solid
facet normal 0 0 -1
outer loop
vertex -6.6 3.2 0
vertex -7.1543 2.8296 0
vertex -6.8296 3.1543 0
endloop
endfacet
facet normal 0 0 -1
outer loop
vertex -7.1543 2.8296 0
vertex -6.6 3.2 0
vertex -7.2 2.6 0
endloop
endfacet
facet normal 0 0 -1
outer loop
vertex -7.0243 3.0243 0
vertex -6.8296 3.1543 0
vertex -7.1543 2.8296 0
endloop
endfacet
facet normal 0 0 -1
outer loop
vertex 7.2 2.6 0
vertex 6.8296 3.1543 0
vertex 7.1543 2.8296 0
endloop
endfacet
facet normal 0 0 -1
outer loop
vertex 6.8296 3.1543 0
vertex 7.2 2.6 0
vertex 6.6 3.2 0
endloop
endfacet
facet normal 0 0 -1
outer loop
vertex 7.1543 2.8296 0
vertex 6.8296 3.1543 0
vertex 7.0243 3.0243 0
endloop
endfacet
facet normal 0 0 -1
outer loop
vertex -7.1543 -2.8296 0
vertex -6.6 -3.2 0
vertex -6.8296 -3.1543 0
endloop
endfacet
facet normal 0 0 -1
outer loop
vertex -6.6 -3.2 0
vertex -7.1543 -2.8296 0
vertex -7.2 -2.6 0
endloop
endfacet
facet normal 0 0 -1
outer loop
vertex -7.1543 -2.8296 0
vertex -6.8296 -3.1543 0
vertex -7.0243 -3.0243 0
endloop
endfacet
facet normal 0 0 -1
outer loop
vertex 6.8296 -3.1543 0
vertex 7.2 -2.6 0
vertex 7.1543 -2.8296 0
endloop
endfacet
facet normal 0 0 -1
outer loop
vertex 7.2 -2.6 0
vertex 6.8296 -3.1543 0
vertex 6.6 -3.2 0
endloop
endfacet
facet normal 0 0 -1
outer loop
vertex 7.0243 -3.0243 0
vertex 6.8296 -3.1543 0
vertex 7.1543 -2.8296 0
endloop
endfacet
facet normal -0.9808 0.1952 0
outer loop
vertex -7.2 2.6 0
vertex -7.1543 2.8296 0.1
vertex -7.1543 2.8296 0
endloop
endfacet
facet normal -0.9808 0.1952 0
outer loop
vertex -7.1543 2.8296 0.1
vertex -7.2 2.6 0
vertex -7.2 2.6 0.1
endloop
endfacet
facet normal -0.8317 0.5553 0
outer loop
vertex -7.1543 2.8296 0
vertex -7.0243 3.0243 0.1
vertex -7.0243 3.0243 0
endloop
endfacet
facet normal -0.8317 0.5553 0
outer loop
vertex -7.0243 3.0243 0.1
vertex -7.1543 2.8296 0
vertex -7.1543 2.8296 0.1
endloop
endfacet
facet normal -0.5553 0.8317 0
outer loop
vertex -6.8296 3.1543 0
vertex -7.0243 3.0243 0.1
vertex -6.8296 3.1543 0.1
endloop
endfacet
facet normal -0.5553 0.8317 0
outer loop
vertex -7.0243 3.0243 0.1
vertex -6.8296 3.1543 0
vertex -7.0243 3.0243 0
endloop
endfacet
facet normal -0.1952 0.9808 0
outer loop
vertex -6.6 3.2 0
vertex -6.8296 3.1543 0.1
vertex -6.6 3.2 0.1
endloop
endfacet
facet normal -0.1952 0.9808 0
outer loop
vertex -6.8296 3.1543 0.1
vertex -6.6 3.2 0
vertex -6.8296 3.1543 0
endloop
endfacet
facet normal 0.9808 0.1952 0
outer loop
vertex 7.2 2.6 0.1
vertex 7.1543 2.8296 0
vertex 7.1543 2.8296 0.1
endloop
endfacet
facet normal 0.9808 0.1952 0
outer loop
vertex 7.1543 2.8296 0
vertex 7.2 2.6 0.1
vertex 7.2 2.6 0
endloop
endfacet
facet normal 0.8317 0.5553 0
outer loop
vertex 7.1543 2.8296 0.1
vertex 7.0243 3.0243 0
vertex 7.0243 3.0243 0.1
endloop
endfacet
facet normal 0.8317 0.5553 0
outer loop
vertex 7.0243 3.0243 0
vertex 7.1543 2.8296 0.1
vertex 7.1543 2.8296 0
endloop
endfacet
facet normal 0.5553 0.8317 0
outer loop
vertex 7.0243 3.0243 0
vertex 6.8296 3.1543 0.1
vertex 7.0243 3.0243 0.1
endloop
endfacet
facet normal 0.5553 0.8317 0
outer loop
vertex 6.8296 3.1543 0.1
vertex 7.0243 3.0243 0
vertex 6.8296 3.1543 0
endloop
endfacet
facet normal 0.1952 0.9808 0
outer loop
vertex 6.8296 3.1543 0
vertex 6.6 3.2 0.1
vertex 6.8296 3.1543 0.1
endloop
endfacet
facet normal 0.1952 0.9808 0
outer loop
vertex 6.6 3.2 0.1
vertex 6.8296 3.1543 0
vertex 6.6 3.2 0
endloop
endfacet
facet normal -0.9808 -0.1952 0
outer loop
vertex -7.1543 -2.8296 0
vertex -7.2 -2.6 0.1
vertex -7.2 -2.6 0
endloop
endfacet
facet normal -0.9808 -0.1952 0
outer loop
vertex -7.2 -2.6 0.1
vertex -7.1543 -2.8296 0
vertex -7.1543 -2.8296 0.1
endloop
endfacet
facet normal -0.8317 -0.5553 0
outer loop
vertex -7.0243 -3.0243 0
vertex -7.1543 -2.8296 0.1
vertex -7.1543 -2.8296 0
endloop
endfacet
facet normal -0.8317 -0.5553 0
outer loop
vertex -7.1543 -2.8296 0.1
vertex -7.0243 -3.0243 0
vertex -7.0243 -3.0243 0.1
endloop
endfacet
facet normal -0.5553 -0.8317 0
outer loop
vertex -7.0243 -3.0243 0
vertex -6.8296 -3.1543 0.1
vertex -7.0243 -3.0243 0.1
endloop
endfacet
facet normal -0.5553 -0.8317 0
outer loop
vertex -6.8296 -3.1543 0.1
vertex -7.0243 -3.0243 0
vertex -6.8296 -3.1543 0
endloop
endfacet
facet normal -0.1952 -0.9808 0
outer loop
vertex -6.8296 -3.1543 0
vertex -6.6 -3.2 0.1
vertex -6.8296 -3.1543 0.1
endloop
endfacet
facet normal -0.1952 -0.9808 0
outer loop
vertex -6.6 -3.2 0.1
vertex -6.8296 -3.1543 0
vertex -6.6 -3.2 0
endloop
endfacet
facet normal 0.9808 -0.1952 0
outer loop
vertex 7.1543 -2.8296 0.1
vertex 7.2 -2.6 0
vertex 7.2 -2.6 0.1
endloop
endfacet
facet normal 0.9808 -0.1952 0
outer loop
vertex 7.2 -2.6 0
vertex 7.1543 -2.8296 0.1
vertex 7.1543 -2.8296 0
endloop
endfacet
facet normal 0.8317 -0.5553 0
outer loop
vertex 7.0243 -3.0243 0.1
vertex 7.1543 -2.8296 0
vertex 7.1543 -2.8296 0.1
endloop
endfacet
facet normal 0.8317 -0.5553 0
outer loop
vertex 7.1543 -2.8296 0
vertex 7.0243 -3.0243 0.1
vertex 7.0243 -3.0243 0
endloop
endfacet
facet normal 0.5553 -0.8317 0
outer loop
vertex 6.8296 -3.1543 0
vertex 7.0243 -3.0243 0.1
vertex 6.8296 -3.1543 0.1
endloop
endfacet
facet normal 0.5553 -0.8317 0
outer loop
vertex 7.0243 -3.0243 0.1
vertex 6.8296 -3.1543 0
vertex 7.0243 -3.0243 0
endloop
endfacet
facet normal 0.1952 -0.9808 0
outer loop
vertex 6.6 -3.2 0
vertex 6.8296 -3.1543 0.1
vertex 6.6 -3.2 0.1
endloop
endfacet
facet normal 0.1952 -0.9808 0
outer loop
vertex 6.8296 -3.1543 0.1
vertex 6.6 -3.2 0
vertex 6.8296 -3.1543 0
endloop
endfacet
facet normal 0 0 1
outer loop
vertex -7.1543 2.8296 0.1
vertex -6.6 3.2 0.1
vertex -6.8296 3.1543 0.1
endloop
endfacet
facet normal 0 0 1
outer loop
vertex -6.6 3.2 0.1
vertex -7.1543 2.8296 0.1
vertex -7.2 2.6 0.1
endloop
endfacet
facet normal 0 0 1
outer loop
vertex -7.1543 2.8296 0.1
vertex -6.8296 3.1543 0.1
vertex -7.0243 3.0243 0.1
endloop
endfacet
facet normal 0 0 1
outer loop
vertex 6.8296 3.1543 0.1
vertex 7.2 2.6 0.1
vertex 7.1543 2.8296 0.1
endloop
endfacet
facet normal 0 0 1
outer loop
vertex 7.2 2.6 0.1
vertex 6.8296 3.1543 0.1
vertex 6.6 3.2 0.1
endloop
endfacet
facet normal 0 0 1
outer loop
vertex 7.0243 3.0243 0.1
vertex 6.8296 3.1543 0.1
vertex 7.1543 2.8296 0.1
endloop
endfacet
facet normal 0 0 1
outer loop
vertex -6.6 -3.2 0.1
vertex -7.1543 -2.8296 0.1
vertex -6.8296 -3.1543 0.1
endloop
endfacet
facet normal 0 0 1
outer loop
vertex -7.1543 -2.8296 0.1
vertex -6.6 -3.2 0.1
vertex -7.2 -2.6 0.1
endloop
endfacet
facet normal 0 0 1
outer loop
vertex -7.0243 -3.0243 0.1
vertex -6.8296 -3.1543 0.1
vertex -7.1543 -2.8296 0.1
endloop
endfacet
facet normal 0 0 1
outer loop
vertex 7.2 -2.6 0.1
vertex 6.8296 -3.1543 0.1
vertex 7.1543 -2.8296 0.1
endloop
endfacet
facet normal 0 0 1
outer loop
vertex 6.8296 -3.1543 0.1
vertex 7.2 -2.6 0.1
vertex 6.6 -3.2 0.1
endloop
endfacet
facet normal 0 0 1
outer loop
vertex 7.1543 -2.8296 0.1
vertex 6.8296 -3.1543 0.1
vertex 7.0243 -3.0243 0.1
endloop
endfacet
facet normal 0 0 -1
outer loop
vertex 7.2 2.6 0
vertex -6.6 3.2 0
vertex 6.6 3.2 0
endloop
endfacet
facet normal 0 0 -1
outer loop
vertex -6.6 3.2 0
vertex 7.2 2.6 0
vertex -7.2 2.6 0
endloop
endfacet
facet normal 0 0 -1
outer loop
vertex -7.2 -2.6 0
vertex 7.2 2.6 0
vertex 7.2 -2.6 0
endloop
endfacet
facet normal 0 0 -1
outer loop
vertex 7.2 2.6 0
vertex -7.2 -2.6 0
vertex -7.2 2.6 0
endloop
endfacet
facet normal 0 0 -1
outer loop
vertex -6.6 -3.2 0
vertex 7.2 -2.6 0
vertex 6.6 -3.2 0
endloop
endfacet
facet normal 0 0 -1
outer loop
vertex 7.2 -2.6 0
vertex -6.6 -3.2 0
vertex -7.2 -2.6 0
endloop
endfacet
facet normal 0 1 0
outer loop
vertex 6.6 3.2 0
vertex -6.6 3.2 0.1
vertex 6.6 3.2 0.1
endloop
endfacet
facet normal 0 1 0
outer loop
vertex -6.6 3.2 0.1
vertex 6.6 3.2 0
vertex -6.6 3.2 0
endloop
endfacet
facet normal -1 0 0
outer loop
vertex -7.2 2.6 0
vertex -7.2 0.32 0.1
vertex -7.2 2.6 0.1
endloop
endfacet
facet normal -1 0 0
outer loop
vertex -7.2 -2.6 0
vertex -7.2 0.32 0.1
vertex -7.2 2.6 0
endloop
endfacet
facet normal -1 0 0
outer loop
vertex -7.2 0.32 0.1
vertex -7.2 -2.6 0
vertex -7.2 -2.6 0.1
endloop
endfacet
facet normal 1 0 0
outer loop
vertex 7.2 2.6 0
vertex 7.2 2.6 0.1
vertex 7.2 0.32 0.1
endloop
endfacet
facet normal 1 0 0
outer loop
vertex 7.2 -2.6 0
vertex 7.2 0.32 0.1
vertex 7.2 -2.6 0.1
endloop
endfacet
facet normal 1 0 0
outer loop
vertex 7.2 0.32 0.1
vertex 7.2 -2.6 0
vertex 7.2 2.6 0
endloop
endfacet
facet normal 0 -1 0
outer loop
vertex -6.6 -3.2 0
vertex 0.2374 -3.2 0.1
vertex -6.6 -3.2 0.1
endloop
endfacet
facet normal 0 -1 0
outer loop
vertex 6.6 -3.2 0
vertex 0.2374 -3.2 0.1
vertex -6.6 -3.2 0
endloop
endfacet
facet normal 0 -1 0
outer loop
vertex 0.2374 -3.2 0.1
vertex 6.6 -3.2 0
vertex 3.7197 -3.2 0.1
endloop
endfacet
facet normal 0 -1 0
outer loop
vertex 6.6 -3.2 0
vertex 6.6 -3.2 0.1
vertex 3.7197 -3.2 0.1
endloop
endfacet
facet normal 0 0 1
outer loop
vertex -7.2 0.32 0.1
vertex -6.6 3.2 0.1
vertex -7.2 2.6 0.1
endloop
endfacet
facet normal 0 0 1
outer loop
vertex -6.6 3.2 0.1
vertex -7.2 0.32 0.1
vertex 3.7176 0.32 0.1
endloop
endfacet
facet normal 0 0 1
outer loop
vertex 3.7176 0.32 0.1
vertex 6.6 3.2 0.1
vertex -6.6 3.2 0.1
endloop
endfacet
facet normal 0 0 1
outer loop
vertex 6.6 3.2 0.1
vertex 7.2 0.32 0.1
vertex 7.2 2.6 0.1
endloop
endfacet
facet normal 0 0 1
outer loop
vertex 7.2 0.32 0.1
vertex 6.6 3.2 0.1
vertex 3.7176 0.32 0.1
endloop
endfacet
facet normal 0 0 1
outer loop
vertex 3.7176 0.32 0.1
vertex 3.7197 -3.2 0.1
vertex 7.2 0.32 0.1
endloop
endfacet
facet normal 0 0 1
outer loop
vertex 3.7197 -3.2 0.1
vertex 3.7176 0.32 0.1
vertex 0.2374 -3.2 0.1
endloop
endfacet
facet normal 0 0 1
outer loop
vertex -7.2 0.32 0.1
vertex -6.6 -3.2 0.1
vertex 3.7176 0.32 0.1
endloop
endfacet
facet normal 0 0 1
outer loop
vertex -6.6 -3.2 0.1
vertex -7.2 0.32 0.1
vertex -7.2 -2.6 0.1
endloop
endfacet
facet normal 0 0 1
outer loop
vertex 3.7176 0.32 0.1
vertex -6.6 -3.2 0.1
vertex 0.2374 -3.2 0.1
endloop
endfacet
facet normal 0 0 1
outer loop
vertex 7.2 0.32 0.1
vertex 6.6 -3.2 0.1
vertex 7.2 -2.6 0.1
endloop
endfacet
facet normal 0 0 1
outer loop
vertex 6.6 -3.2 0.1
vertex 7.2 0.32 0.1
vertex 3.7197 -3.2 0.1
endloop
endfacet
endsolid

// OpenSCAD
// file: ../p/1-4cyli.scad
use <../lib.scad>
function ldraw_lib__1_4cyli() = [
// 0 Cylinder 0.25
// 0 Name: 1-4cyli.dat
// 0 Author: James Jessiman
// 0 !LDRAW_ORG Primitive UPDATE 2012-01
// 0 !LICENSE Licensed under CC BY 4.0 : see CAreadme.txt
// 
// 0 BFC CERTIFY CCW
  [0,"BFC","CERTIFY"],
  [0,"BFC","CCW"],
// 
// 0 !HISTORY 2002-03-23 [sbliss] Added BFC statement.
// 0 !HISTORY 2002-04-25 [PTadmin] Official Update 2002-02
// 0 !HISTORY 2007-06-22 [PTadmin] Header formatted for Contributor Agreement
// 0 !HISTORY 2008-07-01 [PTadmin] Official Update 2008-01
// 0 !HISTORY 2012-02-16 [Philo] Changed to CCW
// 0 !HISTORY 2012-03-30 [PTadmin] Official Update 2012-01
// 
// 
// 4 16 1 1 0 0.9239 1 0.3827 0.9239 0 0.3827 1 0 0
  [4,16,1,1,0,0.9239,1,0.3827,0.9239,0,0.3827,1,0,0],
// 5 24 1 0 0 1 1 0 0.9239 0 0.3827 1 0 -1
  [5,24,1,0,0,1,1,0,0.9239,0,0.3827,1,0,-1],
// 4 16 0.9239 1 0.3827 0.7071 1 0.7071 0.7071 0 0.7071 0.9239 0 0.3827
  [4,16,0.9239,1,0.3827,0.7071,1,0.7071,0.7071,0,0.7071,0.9239,0,0.3827],
// 5 24 0.9239 0 0.3827 0.9239 1 0.3827 0.7071 0 0.7071 1 0 0
  [5,24,0.9239,0,0.3827,0.9239,1,0.3827,0.7071,0,0.7071,1,0,0],
// 4 16 0.7071 1 0.7071 0.3827 1 0.9239 0.3827 0 0.9239 0.7071 0 0.7071
  [4,16,0.7071,1,0.7071,0.3827,1,0.9239,0.3827,0,0.9239,0.7071,0,0.7071],
// 5 24 0.7071 0 0.7071 0.7071 1 0.7071 0.3827 0 0.9239 0.9239 0 0.3827
  [5,24,0.7071,0,0.7071,0.7071,1,0.7071,0.3827,0,0.9239,0.9239,0,0.3827],
// 4 16 0.3827 1 0.9239 0 1 1 0 0 1 0.3827 0 0.9239
  [4,16,0.3827,1,0.9239,0,1,1,0,0,1,0.3827,0,0.9239],
// 5 24 0.3827 0 0.9239 0.3827 1 0.9239 0 0 1 0.7071 0 0.7071
  [5,24,0.3827,0,0.9239,0.3827,1,0.9239,0,0,1,0.7071,0,0.7071],
// 5 24 0 0 1 0 1 1 0.3827 0 0.9239 -1 0 1
  [5,24,0,0,1,0,1,1,0.3827,0,0.9239,-1,0,1],
];
module ldraw_lib__1_4cyli(step=0, col=false, unit=2/5, alt=false, line=0.2, solid=!$preview)
    makepoly(ldraw_lib__1_4cyli(), step=step, col=col, unit=unit, alt=alt, line=line, solid=solid);
ldraw_lib__1_4cyli(line=0.2);
// file: ../p/1-4chrd.scad
use <../lib.scad>
function ldraw_lib__1_4chrd() = [
// 0 Chord 0.25
// 0 Name: 1-4chrd.dat
// 0 Author: Max Martin Richter [MMR1988]
// 0 !LDRAW_ORG Primitive UPDATE 2023-05
// 0 !LICENSE Licensed under CC BY 4.0 : see CAreadme.txt
// 
// 0 BFC CERTIFY CCW
  [0,"BFC","CERTIFY"],
  [0,"BFC","CCW"],
// 
// 0 !HISTORY 2004-04-22 [PTadmin] Official Update 2004-02
// 0 !HISTORY 2007-10-09 [PTadmin] Header formatted for Contributor Agreement
// 0 !HISTORY 2008-07-01 [PTadmin] Official Update 2008-01
// 0 !HISTORY 2012-08-02 [MMR1988] Re-creation with PrimGen2 and Rectifier
// 0 !HISTORY 2012-08-09 [PTadmin] Official Update 2012-02
// 0 !HISTORY 2023-10-27 [OrionP] Change author to MMR1988 from hafhead
// 0 !HISTORY 2023-10-31 [OrionP] Official Update 2023-05
// 
// 4 16 0.9239 0 0.3827 0.3827 0 0.9239 0 0 1 1 0 0
  [4,16,0.9239,0,0.3827,0.3827,0,0.9239,0,0,1,1,0,0],
// 3 16 0.7071 0 0.7071 0.3827 0 0.9239 0.9239 0 0.3827
  [3,16,0.7071,0,0.7071,0.3827,0,0.9239,0.9239,0,0.3827],
];
module ldraw_lib__1_4chrd(step=0, col=false, unit=2/5, alt=false, line=0.2, solid=!$preview)
    makepoly(ldraw_lib__1_4chrd(), step=step, col=col, unit=unit, alt=alt, line=line, solid=solid);
ldraw_lib__1_4chrd(line=0.2);
// main file
use <../lib.scad>
use <../p/1-4chrd.scad>
use <../p/1-4cyli.scad>
function ldraw_lib__6148328as() = [
// 0 Sticker  0.8 x  1.8 with Dark Grey Lines on White Background
// 0 Name: 6148328as.dat
// 0 Author: Massimo Maso [Sirio]
// 0 !LDRAW_ORG Part UPDATE 2024-08
// 0 !LICENSE Licensed under CC BY 4.0 : see CAreadme.txt
// 
// 0 BFC CERTIFY CCW
  [0,"BFC","CERTIFY"],
  [0,"BFC","CCW"],
// 
// 0 !KEYWORDS 919, Bricklink 75876stk01, Brickowl 852010, Hybrid, Pit Lane
// 0 !KEYWORDS Porsche, Rebrickable 26357, set 75876, Speed Champions
// 
// 0 !HISTORY 2024-09-30 [OrionP] Official Update 2024-08
// 
// 
// 0 // Primitives
// 1 16 -16.5 0 6.5 -1.5 0 0 0 -1 0 0 0 1.5 1-4chrd.dat
  [1,16,-16.5,0,6.5,-1.5,0,0,0,-1,0,0,0,1.5, ldraw_lib__1_4chrd()],
// 1 16 16.5 0 6.5 1.5 0 0 0 -1 0 0 0 1.5 1-4chrd.dat
  [1,16,16.5,0,6.5,1.5,0,0,0,-1,0,0,0,1.5, ldraw_lib__1_4chrd()],
// 1 16 -16.5 0 -6.5 -1.5 0 0 0 -1 0 0 0 -1.5 1-4chrd.dat
  [1,16,-16.5,0,-6.5,-1.5,0,0,0,-1,0,0,0,-1.5, ldraw_lib__1_4chrd()],
// 1 16 16.5 0 -6.5 1.5 0 0 0 -1 0 0 0 -1.5 1-4chrd.dat
  [1,16,16.5,0,-6.5,1.5,0,0,0,-1,0,0,0,-1.5, ldraw_lib__1_4chrd()],
// 1 16 -16.5 0 6.5 -1.5 0 0 0 -.25 0 0 0 1.5 1-4cyli.dat
  [1,16,-16.5,0,6.5,-1.5,0,0,0,-.25,0,0,0,1.5, ldraw_lib__1_4cyli()],
// 1 16 16.5 0 6.5 1.5 0 0 0 -.25 0 0 0 1.5 1-4cyli.dat
  [1,16,16.5,0,6.5,1.5,0,0,0,-.25,0,0,0,1.5, ldraw_lib__1_4cyli()],
// 1 16 -16.5 0 -6.5 -1.5 0 0 0 -.25 0 0 0 -1.5 1-4cyli.dat
  [1,16,-16.5,0,-6.5,-1.5,0,0,0,-.25,0,0,0,-1.5, ldraw_lib__1_4cyli()],
// 1 16 16.5 0 -6.5 1.5 0 0 0 -.25 0 0 0 -1.5 1-4cyli.dat
  [1,16,16.5,0,-6.5,1.5,0,0,0,-.25,0,0,0,-1.5, ldraw_lib__1_4cyli()],
// 1 72 -16.5 -.25 6.5 -1.5 0 0 0 1 0 0 0 1.5 1-4chrd.dat
  [1,72,-16.5,-.25,6.5,-1.5,0,0,0,1,0,0,0,1.5, ldraw_lib__1_4chrd()],
// 1 72 16.5 -.25 6.5 1.5 0 0 0 1 0 0 0 1.5 1-4chrd.dat
  [1,72,16.5,-.25,6.5,1.5,0,0,0,1,0,0,0,1.5, ldraw_lib__1_4chrd()],
// 1 15 -16.5 -.25 -6.5 -1.5 0 0 0 1 0 0 0 -1.5 1-4chrd.dat
  [1,15,-16.5,-.25,-6.5,-1.5,0,0,0,1,0,0,0,-1.5, ldraw_lib__1_4chrd()],
// 1 15 16.5 -.25 -6.5 1.5 0 0 0 1 0 0 0 -1.5 1-4chrd.dat
  [1,15,16.5,-.25,-6.5,1.5,0,0,0,1,0,0,0,-1.5, ldraw_lib__1_4chrd()],
// 0 // Bottom faces
// 4 16 16.5 0 8 18 0 6.5 -18 0 6.5 -16.5 0 8
  [4,16,16.5,0,8,18,0,6.5,-18,0,6.5,-16.5,0,8],
// 4 16 18 0 6.5 18 0 -6.5 -18 0 -6.5 -18 0 6.5
  [4,16,18,0,6.5,18,0,-6.5,-18,0,-6.5,-18,0,6.5],
// 4 16 16.5 0 -8 -16.5 0 -8 -18 0 -6.5 18 0 -6.5
  [4,16,16.5,0,-8,-16.5,0,-8,-18,0,-6.5,18,0,-6.5],
// 0 // Lateral faces
// 4 16 -16.5 0 8 -16.5 -.25 8 16.5 -.25 8 16.5 0 8
  [4,16,-16.5,0,8,-16.5,-.25,8,16.5,-.25,8,16.5,0,8],
// 3 16 -18 0 6.5 -18 -.25 .8 -18 -.25 6.5
  [3,16,-18,0,6.5,-18,-.25,.8,-18,-.25,6.5],
// 4 16 -18 0 6.5 -18 0 -6.5 -18 -.25 -6.5 -18 -.25 .8
  [4,16,-18,0,6.5,-18,0,-6.5,-18,-.25,-6.5,-18,-.25,.8],
// 3 16 18 0 6.5 18 -.25 6.5 18 -.25 .8
  [3,16,18,0,6.5,18,-.25,6.5,18,-.25,.8],
// 4 16 18 0 6.5 18 -.25 .8 18 -.25 -6.5 18 0 -6.5
  [4,16,18,0,6.5,18,-.25,.8,18,-.25,-6.5,18,0,-6.5],
// 3 16 -16.5 0 -8 .5934 -.25 -8 -16.5 -.25 -8
  [3,16,-16.5,0,-8,.5934,-.25,-8,-16.5,-.25,-8],
// 4 16 -16.5 0 -8 16.5 0 -8 9.2993 -.25 -8 .5934 -.25 -8
  [4,16,-16.5,0,-8,16.5,0,-8,9.2993,-.25,-8,.5934,-.25,-8],
// 3 16 16.5 0 -8 16.5 -.25 -8 9.2993 -.25 -8
  [3,16,16.5,0,-8,16.5,-.25,-8,9.2993,-.25,-8],
// 0 // Top faces
// 0 // Dark grey faces
// 4 72 9.2941 -.25 .8 -16.5 -.25 8 -18 -.25 6.5 -18 -.25 .8
  [4,72,9.2941,-.25,.8,-16.5,-.25,8,-18,-.25,6.5,-18,-.25,.8],
// 3 72 9.2941 -.25 .8 16.5 -.25 8 -16.5 -.25 8
  [3,72,9.2941,-.25,.8,16.5,-.25,8,-16.5,-.25,8],
// 4 72 9.2941 -.25 .8 18 -.25 .8 18 -.25 6.5 16.5 -.25 8
  [4,72,9.2941,-.25,.8,18,-.25,.8,18,-.25,6.5,16.5,-.25,8],
// 4 72 9.2941 -.25 .8 .5934 -.25 -8 9.2993 -.25 -8 18 -.25 .8
  [4,72,9.2941,-.25,.8,.5934,-.25,-8,9.2993,-.25,-8,18,-.25,.8],
// 0 // White faces
// 4 15 9.2941 -.25 .8 -18 -.25 .8 -18 -.25 -6.5 -16.5 -.25 -8
  [4,15,9.2941,-.25,.8,-18,-.25,.8,-18,-.25,-6.5,-16.5,-.25,-8],
// 3 15 9.2941 -.25 .8 -16.5 -.25 -8 .5934 -.25 -8
  [3,15,9.2941,-.25,.8,-16.5,-.25,-8,.5934,-.25,-8],
// 4 15 18 -.25 .8 9.2993 -.25 -8 16.5 -.25 -8 18 -.25 -6.5
  [4,15,18,-.25,.8,9.2993,-.25,-8,16.5,-.25,-8,18,-.25,-6.5],
];
module ldraw_lib__6148328as(step=0, col=false, unit=2/5, alt=false, line=0.2, solid=!$preview)
    makepoly(ldraw_lib__6148328as(), step=step, col=col, unit=unit, alt=alt, line=line, solid=solid);
ldraw_lib__6148328as(line=0.2);
